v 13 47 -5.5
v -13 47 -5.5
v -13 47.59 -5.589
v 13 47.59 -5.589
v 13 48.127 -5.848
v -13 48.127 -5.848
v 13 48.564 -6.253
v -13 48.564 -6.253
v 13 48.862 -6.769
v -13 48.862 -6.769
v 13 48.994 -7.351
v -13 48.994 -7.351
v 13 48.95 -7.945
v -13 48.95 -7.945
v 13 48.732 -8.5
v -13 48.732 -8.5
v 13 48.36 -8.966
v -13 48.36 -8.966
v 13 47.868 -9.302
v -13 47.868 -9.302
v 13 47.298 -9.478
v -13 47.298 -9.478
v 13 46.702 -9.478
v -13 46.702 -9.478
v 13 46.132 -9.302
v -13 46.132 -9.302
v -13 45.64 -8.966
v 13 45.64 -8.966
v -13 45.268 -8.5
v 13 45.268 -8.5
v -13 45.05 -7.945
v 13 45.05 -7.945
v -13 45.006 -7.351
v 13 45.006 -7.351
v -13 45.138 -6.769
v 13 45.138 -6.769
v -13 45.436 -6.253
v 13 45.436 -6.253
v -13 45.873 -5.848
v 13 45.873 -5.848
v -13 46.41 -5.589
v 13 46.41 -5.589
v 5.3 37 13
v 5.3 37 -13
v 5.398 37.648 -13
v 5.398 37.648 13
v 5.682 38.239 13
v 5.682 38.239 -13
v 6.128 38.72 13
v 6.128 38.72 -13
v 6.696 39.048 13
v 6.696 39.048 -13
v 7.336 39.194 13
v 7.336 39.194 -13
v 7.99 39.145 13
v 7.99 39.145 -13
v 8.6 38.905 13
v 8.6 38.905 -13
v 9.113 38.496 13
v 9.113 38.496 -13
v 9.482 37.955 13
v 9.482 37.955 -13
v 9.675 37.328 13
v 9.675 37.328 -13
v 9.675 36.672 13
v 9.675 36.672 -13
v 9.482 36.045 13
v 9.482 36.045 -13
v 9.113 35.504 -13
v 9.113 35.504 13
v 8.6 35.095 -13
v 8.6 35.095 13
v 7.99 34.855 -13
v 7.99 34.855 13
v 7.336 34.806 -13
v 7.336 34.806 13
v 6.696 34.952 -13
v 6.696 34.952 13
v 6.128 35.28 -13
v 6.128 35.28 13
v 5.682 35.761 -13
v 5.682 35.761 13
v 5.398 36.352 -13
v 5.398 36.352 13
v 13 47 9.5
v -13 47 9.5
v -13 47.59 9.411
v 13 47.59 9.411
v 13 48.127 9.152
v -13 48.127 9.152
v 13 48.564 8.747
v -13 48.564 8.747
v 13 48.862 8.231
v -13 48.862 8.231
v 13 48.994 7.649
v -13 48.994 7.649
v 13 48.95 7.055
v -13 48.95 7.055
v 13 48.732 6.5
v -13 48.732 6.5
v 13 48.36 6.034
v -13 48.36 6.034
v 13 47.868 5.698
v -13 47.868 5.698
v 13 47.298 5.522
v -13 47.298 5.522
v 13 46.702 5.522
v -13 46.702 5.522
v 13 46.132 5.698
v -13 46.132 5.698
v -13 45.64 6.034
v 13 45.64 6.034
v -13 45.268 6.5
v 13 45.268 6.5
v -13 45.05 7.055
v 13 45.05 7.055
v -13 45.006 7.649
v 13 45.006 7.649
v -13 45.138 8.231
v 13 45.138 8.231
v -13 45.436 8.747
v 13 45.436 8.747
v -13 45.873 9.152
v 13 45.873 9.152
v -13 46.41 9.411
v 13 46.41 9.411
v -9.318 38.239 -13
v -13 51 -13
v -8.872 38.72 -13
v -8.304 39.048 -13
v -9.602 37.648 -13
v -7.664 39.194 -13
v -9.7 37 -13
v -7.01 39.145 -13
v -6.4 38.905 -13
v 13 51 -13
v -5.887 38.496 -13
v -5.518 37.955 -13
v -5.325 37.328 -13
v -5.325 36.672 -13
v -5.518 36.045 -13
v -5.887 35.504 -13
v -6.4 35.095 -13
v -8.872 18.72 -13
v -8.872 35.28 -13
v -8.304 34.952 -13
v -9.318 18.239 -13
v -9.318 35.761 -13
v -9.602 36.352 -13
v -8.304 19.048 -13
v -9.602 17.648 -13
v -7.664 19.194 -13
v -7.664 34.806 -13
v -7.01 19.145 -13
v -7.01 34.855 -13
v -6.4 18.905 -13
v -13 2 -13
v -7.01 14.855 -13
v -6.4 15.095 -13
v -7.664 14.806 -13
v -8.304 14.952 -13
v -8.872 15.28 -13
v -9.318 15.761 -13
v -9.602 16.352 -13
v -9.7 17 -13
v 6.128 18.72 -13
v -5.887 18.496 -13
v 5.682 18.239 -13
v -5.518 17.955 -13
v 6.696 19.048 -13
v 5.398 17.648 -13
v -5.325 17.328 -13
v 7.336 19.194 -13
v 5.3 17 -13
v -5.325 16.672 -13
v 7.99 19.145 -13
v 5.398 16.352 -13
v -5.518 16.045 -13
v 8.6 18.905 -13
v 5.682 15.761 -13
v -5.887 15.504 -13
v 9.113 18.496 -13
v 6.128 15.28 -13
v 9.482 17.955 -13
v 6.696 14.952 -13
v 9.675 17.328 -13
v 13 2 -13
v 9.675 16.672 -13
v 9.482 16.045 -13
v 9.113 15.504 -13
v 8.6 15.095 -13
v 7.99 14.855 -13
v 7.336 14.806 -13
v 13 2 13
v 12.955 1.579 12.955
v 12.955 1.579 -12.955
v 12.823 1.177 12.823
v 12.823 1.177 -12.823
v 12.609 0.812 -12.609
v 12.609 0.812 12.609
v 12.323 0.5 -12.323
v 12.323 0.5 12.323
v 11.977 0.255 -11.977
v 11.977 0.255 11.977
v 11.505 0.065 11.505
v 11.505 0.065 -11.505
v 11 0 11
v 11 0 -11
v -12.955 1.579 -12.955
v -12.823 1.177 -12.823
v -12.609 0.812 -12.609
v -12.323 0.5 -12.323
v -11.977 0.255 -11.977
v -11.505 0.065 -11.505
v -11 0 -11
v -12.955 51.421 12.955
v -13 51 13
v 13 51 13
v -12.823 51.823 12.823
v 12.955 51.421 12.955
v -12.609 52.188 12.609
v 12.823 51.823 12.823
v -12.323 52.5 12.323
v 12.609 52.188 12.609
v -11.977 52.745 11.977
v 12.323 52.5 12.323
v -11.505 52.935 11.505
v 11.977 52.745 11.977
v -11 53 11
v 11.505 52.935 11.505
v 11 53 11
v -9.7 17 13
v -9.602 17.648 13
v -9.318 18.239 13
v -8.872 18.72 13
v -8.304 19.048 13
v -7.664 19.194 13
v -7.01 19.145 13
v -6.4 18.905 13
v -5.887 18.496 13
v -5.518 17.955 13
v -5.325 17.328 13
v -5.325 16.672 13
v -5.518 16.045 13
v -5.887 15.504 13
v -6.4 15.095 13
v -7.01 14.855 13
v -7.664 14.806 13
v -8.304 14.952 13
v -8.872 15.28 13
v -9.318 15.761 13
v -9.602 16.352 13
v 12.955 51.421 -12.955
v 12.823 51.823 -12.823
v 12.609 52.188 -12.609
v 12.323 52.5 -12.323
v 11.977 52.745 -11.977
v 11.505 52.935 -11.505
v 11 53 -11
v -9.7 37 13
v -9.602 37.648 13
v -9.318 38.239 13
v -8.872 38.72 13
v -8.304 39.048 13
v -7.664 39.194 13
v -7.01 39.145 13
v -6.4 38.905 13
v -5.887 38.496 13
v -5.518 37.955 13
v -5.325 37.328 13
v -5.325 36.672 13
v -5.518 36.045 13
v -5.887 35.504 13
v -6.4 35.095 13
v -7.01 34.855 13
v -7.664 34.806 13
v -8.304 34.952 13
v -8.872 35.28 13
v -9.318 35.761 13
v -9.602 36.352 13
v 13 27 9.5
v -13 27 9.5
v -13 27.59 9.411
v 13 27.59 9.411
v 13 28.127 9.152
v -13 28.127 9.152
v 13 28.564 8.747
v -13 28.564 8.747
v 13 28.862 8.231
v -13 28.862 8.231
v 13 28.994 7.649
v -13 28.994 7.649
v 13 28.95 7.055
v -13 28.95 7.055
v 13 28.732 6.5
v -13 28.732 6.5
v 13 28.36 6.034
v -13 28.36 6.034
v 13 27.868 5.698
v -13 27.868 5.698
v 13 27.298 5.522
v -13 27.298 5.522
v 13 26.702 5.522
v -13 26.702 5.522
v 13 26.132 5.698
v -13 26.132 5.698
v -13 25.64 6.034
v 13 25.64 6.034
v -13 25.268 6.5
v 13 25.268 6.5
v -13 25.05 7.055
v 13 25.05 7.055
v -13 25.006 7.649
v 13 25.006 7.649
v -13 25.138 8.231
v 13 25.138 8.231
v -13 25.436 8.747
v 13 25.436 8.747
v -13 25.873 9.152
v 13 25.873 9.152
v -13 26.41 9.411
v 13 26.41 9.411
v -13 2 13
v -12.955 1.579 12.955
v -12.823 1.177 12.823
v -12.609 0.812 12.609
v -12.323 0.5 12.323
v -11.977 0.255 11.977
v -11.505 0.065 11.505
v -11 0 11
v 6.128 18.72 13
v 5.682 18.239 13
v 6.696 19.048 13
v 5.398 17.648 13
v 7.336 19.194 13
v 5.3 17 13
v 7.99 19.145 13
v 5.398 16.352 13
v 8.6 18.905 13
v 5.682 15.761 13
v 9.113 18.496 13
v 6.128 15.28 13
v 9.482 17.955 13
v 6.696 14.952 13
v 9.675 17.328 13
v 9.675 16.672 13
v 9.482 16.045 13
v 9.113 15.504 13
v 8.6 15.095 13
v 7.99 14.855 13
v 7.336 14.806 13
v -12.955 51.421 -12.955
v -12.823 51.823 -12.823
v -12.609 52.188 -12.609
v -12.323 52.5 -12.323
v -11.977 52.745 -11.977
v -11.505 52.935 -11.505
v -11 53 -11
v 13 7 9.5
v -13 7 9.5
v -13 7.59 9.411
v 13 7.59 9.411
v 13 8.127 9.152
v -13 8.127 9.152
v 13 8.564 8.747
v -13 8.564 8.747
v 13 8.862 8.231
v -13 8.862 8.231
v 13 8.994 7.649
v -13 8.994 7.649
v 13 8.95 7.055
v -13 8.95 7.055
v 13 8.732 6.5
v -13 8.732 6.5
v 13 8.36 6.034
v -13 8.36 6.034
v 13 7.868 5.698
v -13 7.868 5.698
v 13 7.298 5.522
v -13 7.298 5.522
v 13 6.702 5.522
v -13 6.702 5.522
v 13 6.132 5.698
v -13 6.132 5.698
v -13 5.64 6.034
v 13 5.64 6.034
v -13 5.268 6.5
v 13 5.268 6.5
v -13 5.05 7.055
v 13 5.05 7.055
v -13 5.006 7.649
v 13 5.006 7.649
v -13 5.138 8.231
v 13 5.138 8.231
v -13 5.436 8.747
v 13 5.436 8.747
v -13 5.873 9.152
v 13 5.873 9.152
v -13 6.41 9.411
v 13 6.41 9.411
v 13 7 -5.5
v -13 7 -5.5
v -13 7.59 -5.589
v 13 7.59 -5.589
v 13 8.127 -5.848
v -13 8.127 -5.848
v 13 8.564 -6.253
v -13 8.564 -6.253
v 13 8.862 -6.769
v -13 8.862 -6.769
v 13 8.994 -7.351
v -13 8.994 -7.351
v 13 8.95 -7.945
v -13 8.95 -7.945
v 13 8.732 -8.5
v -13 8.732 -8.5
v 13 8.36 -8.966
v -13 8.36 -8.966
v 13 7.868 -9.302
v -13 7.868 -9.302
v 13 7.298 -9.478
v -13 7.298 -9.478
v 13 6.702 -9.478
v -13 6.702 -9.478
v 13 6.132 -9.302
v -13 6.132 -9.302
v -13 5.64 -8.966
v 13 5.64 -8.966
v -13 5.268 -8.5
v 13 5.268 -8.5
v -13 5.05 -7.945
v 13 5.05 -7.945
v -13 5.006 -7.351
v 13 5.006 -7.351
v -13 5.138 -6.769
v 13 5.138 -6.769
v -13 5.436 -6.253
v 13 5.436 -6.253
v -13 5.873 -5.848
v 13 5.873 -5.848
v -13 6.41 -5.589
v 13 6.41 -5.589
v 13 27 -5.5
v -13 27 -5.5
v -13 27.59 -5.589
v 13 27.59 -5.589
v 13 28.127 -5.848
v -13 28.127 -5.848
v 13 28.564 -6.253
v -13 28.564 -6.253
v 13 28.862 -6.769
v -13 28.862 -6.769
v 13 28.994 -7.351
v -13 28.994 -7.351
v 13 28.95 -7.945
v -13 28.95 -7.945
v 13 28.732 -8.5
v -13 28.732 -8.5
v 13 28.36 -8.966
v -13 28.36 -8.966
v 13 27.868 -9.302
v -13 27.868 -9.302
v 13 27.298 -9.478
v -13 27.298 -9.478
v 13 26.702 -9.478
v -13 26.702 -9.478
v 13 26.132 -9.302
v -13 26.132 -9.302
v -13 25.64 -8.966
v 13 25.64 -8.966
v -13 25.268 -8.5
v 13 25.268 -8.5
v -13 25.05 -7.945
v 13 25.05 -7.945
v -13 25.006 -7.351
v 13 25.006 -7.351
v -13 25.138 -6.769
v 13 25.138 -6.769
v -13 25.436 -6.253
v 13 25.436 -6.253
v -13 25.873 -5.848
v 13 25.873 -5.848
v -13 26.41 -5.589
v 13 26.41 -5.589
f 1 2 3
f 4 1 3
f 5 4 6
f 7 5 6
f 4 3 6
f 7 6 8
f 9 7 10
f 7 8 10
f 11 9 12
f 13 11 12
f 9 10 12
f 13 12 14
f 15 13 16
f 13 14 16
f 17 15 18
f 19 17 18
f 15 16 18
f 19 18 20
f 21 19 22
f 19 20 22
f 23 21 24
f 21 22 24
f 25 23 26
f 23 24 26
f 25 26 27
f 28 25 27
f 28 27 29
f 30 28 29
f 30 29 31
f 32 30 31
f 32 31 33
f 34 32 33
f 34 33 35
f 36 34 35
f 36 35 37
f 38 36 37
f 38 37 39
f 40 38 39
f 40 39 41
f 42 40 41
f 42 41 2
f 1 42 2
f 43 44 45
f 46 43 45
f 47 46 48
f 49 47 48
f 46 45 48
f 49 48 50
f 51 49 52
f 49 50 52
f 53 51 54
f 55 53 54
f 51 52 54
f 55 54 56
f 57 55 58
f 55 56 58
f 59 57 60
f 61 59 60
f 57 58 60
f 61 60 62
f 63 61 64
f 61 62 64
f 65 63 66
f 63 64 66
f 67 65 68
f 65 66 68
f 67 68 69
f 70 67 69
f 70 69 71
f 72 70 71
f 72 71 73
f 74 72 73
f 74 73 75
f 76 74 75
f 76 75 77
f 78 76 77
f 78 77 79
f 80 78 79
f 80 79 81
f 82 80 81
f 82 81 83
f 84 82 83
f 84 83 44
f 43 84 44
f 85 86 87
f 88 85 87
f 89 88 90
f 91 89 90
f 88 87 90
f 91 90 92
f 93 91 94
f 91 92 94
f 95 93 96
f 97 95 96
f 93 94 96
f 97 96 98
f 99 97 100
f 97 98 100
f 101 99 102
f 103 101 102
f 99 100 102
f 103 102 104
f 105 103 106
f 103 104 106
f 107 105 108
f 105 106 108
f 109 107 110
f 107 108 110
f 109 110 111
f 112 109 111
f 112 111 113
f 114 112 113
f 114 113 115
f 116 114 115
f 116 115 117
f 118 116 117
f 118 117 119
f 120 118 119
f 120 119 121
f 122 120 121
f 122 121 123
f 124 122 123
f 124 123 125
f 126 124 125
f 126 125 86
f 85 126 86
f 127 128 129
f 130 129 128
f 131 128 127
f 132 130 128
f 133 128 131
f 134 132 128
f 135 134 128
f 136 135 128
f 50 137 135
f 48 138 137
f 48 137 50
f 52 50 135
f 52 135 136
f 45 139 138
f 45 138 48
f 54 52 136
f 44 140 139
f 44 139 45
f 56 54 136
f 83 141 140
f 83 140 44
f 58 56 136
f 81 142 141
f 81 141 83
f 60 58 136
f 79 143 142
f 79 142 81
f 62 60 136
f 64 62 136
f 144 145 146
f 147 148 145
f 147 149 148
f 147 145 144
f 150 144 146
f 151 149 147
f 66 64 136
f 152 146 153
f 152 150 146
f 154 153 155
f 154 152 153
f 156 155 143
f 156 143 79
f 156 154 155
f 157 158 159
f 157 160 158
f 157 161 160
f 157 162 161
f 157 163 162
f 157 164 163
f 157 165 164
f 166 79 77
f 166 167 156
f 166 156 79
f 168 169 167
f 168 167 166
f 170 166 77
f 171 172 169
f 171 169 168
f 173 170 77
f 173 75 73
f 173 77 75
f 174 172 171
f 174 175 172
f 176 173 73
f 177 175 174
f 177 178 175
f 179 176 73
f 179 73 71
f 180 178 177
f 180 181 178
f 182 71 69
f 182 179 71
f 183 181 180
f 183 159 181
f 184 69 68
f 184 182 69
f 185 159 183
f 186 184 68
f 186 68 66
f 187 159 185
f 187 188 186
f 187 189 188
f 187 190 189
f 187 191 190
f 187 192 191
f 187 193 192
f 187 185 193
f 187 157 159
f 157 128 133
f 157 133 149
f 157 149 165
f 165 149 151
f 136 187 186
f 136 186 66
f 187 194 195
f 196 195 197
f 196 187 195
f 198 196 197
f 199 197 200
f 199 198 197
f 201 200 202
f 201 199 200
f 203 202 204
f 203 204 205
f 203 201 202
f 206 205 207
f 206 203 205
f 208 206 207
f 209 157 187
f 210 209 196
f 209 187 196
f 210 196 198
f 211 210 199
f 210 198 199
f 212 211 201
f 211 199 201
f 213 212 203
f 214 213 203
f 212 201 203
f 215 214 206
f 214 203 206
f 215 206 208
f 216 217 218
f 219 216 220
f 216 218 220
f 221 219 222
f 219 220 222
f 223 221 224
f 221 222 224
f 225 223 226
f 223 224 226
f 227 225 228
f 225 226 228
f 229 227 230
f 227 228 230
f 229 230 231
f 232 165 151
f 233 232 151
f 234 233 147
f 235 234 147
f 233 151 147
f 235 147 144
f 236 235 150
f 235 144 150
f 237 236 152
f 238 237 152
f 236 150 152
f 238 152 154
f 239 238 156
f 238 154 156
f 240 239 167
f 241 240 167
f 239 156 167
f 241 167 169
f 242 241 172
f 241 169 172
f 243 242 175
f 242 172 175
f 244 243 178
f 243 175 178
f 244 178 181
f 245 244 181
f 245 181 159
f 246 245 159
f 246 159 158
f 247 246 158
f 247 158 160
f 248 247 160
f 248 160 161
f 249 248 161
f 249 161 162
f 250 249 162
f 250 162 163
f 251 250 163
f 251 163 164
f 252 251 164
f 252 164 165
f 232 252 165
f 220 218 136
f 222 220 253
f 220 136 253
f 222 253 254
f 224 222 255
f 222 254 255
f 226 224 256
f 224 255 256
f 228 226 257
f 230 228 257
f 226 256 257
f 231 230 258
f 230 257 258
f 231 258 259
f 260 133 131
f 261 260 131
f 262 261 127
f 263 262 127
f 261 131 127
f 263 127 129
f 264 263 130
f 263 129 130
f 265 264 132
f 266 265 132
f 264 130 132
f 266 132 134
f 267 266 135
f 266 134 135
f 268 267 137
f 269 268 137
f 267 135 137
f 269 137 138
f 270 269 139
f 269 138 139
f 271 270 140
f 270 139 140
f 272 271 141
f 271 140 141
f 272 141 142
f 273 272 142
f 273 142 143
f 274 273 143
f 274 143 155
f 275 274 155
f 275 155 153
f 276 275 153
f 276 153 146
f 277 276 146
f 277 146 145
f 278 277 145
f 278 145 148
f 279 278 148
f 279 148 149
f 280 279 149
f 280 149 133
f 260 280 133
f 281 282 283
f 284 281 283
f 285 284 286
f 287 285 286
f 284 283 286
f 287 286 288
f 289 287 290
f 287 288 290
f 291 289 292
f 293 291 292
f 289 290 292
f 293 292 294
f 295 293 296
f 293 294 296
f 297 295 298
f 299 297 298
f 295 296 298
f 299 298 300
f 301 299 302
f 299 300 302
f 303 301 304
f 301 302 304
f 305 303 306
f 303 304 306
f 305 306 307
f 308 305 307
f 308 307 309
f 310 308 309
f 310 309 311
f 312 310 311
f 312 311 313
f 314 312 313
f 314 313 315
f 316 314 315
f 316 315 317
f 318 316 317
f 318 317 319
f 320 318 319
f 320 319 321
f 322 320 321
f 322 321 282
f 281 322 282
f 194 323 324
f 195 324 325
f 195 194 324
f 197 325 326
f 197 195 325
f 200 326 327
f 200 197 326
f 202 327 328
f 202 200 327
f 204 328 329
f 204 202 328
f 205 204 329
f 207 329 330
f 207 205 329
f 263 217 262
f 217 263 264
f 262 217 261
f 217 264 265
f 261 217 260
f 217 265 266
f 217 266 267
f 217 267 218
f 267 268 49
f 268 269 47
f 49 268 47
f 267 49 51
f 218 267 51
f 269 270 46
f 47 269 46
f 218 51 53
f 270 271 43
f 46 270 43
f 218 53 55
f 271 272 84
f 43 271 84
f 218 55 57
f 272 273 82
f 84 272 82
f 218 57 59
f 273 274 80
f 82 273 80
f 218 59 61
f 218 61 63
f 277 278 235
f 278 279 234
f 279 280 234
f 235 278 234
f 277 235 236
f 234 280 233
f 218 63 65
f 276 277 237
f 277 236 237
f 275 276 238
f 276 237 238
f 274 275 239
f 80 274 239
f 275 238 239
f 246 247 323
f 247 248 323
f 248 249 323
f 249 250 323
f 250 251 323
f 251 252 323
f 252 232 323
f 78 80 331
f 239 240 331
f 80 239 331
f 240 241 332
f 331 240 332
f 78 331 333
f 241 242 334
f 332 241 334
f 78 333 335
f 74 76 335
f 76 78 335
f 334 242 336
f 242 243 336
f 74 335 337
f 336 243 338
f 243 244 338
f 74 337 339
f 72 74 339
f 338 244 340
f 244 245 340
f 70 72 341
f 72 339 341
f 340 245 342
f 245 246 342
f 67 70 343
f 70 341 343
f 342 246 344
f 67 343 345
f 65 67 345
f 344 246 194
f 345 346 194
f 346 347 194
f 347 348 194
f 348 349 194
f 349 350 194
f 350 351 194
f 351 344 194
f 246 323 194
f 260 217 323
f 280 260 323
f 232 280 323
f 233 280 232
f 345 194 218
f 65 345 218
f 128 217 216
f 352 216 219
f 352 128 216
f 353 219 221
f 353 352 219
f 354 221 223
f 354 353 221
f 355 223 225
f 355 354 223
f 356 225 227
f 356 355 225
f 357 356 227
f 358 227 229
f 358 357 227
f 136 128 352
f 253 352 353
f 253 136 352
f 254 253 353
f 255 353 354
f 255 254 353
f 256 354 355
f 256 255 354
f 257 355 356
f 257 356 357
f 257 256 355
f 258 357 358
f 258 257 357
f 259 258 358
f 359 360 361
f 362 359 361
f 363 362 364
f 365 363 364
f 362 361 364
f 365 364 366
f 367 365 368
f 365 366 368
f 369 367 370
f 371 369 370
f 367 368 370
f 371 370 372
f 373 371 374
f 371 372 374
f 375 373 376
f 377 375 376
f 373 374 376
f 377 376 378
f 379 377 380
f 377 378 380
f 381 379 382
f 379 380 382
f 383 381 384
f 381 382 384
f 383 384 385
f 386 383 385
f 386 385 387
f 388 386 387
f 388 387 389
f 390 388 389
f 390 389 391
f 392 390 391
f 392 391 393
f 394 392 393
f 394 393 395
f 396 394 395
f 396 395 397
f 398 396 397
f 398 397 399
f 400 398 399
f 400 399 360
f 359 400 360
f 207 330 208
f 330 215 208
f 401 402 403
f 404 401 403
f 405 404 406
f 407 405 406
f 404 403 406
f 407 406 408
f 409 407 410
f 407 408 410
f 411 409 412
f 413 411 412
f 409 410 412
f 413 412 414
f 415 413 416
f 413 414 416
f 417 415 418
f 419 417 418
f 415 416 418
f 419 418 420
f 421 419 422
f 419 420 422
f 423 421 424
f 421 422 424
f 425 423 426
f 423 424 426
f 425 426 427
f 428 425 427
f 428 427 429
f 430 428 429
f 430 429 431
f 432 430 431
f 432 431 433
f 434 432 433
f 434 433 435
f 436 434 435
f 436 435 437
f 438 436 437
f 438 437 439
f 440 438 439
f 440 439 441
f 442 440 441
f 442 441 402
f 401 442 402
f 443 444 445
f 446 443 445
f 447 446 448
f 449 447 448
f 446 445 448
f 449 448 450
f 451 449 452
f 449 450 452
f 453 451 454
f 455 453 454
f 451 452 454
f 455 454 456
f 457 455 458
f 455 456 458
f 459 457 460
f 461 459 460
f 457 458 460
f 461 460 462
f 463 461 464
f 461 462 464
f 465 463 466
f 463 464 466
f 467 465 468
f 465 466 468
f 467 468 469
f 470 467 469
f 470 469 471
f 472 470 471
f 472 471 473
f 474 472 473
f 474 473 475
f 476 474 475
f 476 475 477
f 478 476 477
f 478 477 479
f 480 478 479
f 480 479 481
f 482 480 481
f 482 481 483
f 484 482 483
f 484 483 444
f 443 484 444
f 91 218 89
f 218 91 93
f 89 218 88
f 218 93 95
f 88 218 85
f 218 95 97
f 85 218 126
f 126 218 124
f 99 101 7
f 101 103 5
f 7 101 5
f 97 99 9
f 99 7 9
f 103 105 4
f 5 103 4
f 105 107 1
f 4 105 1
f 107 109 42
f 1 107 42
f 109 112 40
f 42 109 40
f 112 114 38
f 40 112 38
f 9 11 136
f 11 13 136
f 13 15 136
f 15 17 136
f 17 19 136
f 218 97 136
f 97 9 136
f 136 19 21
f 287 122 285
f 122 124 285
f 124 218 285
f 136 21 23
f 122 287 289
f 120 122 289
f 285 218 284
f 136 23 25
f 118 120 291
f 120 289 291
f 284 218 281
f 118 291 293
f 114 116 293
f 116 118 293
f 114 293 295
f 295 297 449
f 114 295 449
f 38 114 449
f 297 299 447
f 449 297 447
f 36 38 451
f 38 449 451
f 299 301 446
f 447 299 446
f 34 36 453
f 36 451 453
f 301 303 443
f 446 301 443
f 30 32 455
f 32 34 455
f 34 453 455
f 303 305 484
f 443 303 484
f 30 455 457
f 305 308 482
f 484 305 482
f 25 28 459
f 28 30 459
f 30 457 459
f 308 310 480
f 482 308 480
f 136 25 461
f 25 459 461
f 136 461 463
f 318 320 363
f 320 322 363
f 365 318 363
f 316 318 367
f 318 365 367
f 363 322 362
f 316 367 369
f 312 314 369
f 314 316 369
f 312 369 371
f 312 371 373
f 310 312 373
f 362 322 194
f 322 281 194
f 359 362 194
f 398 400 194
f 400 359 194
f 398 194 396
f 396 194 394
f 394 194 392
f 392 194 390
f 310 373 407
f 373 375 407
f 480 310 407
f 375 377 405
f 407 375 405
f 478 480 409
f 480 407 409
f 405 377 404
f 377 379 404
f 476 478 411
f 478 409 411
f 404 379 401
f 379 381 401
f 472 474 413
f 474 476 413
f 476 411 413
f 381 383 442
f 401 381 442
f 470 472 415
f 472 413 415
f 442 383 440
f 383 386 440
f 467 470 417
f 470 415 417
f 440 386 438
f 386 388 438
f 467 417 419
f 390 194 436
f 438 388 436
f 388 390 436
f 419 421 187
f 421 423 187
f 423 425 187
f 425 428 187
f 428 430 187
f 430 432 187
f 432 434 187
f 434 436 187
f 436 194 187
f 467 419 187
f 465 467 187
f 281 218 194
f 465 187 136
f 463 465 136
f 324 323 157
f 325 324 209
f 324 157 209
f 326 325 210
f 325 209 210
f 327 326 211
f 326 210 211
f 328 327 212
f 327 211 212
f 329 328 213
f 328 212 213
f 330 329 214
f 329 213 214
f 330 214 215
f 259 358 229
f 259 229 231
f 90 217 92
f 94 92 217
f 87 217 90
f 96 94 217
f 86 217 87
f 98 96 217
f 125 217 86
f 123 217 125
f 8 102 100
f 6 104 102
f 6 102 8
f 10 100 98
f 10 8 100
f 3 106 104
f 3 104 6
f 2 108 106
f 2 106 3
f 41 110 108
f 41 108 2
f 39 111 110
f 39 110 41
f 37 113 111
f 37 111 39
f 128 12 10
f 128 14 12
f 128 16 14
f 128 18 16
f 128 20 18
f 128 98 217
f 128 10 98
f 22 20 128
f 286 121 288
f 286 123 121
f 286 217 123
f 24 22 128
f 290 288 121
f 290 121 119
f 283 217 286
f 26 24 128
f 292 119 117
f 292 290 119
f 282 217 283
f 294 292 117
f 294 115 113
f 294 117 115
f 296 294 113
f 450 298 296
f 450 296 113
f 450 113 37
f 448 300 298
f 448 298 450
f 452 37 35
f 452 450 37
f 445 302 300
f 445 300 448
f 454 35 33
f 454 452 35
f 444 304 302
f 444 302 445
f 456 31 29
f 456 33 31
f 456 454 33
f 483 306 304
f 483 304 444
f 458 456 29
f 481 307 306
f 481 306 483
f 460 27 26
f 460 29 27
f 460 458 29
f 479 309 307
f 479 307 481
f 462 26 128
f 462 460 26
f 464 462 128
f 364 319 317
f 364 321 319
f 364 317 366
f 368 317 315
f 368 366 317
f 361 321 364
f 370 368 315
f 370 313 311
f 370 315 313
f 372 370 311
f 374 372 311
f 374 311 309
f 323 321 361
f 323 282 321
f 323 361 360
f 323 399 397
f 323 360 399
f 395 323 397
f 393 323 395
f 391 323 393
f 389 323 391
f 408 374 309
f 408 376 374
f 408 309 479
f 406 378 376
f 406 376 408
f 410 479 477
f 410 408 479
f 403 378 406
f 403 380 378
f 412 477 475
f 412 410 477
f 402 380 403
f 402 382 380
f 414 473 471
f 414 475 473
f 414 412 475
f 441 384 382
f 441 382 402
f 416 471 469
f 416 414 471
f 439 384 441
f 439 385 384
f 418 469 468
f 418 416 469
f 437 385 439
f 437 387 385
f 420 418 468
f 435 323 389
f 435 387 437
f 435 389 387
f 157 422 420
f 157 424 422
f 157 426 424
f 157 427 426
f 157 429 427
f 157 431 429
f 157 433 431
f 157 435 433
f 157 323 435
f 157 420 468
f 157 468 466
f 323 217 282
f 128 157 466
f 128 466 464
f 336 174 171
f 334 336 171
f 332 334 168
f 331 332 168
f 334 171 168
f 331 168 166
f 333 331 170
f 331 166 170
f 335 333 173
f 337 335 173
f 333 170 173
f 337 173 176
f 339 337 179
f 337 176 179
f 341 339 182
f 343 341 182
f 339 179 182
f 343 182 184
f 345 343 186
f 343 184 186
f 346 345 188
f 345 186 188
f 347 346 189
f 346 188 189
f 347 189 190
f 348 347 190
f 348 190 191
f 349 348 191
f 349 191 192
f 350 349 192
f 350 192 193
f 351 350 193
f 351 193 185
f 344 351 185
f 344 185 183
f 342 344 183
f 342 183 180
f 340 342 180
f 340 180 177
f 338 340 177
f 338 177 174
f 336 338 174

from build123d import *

# Parameters (mm, degrees)
SKETCH_1_W          = 26
SKETCH_1_H          = 26
EXTRUDE_1_DEPTH     = 53
FILLET_2_R          = 2
CUT_EXTRUDE_1_REACH = 62.448
SKETCH_2_R          = 1.55
CUT_EXTRUDE_2_REACH = 62.448
SKETCH_3_R          = 2
CUT_EXTRUDE_3_REACH = 62.448
SKETCH_4_R          = 2.2


with BuildPart() as part:
    # 草图1 → 凸台-拉伸1 (new body)
    with BuildSketch(Plane(origin=(0, 0, 0), x_dir=(1, 0, 0), z_dir=(0, 1, 0))):
        Rectangle(SKETCH_1_W, SKETCH_1_H)
    extrude(amount=EXTRUDE_1_DEPTH)

    # 圆角2
    fillet_2_edges = [part.edges().sort_by_distance(p)[0] for p in [
        (-13, 53, 0),
        (0, 53, 13),
        (13, 53, 0),
        (0, 0, 13),
        (-13, 0, 0),
        (0, 0, -13),
        (13, 0, 0),
        (0, 53, -13),
    ]]
    fillet(fillet_2_edges, radius=FILLET_2_R)

    # 草图2 → 切除-拉伸1 (cut, up to next)
    with BuildSketch(Plane.XY.offset(13), mode=Mode.PRIVATE) as cut_extrude_1_sk1:
        with Locations((-7.5, 37)):
            Circle(SKETCH_2_R)
    cut_extrude_1_tool1 = extrude(cut_extrude_1_sk1.sketch, amount=-CUT_EXTRUDE_1_REACH, mode=Mode.PRIVATE) & part.part
    # 草图2 → 切除-拉伸1 (cut, up to next)
    with BuildSketch(Plane.XY.offset(13), mode=Mode.PRIVATE) as cut_extrude_1_sk2:
        with Locations((7.5, 37)):
            Circle(SKETCH_2_R)
    cut_extrude_1_tool2 = extrude(cut_extrude_1_sk2.sketch, amount=-CUT_EXTRUDE_1_REACH, mode=Mode.PRIVATE) & part.part
    # 草图2 → 切除-拉伸1 (cut, up to next)
    with BuildSketch(Plane.XY.offset(13), mode=Mode.PRIVATE) as cut_extrude_1_sk3:
        with Locations((-7.5, 17)):
            Circle(SKETCH_2_R)
    cut_extrude_1_tool3 = extrude(cut_extrude_1_sk3.sketch, amount=-CUT_EXTRUDE_1_REACH, mode=Mode.PRIVATE) & part.part
    # 草图2 → 切除-拉伸1 (cut, up to next)
    with BuildSketch(Plane.XY.offset(13), mode=Mode.PRIVATE) as cut_extrude_1_sk4:
        with Locations((7.5, 17)):
            Circle(SKETCH_2_R)
    cut_extrude_1_tool4 = extrude(cut_extrude_1_sk4.sketch, amount=-CUT_EXTRUDE_1_REACH, mode=Mode.PRIVATE) & part.part
    add(cut_extrude_1_tool1.solids().sort_by_distance((-7.5, 37, 13))[0], mode=Mode.SUBTRACT)
    add(cut_extrude_1_tool2.solids().sort_by_distance((7.5, 37, 13))[0], mode=Mode.SUBTRACT)
    add(cut_extrude_1_tool3.solids().sort_by_distance((-7.5, 17, 13))[0], mode=Mode.SUBTRACT)
    add(cut_extrude_1_tool4.solids().sort_by_distance((7.5, 17, 13))[0], mode=Mode.SUBTRACT)

    # 草图3 → 切除-拉伸2 (cut, up to next)
    with BuildSketch(Plane.ZY.offset(13), mode=Mode.PRIVATE) as cut_extrude_2_sk1:
        with Locations((-7.5, 47)):
            Circle(SKETCH_3_R)
    cut_extrude_2_tool1 = extrude(cut_extrude_2_sk1.sketch, amount=-CUT_EXTRUDE_2_REACH, mode=Mode.PRIVATE) & part.part
    # 草图3 → 切除-拉伸2 (cut, up to next)
    with BuildSketch(Plane.ZY.offset(13), mode=Mode.PRIVATE) as cut_extrude_2_sk2:
        with Locations((7.5, 47)):
            Circle(SKETCH_3_R)
    cut_extrude_2_tool2 = extrude(cut_extrude_2_sk2.sketch, amount=-CUT_EXTRUDE_2_REACH, mode=Mode.PRIVATE) & part.part
    # 草图3 → 切除-拉伸2 (cut, up to next)
    with BuildSketch(Plane.ZY.offset(13), mode=Mode.PRIVATE) as cut_extrude_2_sk3:
        with Locations((-7.5, 27)):
            Circle(SKETCH_3_R)
    cut_extrude_2_tool3 = extrude(cut_extrude_2_sk3.sketch, amount=-CUT_EXTRUDE_2_REACH, mode=Mode.PRIVATE) & part.part
    # 草图3 → 切除-拉伸2 (cut, up to next)
    with BuildSketch(Plane.ZY.offset(13), mode=Mode.PRIVATE) as cut_extrude_2_sk4:
        with Locations((7.5, 27)):
            Circle(SKETCH_3_R)
    cut_extrude_2_tool4 = extrude(cut_extrude_2_sk4.sketch, amount=-CUT_EXTRUDE_2_REACH, mode=Mode.PRIVATE) & part.part
    # 草图3 → 切除-拉伸2 (cut, up to next)
    with BuildSketch(Plane.ZY.offset(13), mode=Mode.PRIVATE) as cut_extrude_2_sk5:
        with Locations((-7.5, 7)):
            Circle(SKETCH_3_R)
    cut_extrude_2_tool5 = extrude(cut_extrude_2_sk5.sketch, amount=-CUT_EXTRUDE_2_REACH, mode=Mode.PRIVATE) & part.part
    # 草图3 → 切除-拉伸2 (cut, up to next)
    with BuildSketch(Plane.ZY.offset(13), mode=Mode.PRIVATE) as cut_extrude_2_sk6:
        with Locations((7.5, 7)):
            Circle(SKETCH_3_R)
    cut_extrude_2_tool6 = extrude(cut_extrude_2_sk6.sketch, amount=-CUT_EXTRUDE_2_REACH, mode=Mode.PRIVATE) & part.part
    add(cut_extrude_2_tool1.solids().sort_by_distance((-13, 47, -7.5))[0], mode=Mode.SUBTRACT)
    add(cut_extrude_2_tool2.solids().sort_by_distance((-13, 47, 7.5))[0], mode=Mode.SUBTRACT)
    add(cut_extrude_2_tool3.solids().sort_by_distance((-13, 27, -7.5))[0], mode=Mode.SUBTRACT)
    add(cut_extrude_2_tool4.solids().sort_by_distance((-13, 27, 7.5))[0], mode=Mode.SUBTRACT)
    add(cut_extrude_2_tool5.solids().sort_by_distance((-13, 7, -7.5))[0], mode=Mode.SUBTRACT)
    add(cut_extrude_2_tool6.solids().sort_by_distance((-13, 7, 7.5))[0], mode=Mode.SUBTRACT)

    # 草图4 → 切除-拉伸3 (cut, up to next)
    with BuildSketch(Plane(origin=(0, 0, -13), x_dir=(-1, 0, 0), z_dir=(0, 0, -1)), mode=Mode.PRIVATE) as cut_extrude_3_sk1:
        with Locations((-7.5, 37)):
            Circle(SKETCH_4_R)
    cut_extrude_3_tool1 = extrude(cut_extrude_3_sk1.sketch, amount=-CUT_EXTRUDE_3_REACH, mode=Mode.PRIVATE) & part.part
    # 草图4 → 切除-拉伸3 (cut, up to next)
    with BuildSketch(Plane(origin=(0, 0, -13), x_dir=(-1, 0, 0), z_dir=(0, 0, -1)), mode=Mode.PRIVATE) as cut_extrude_3_sk2:
        with Locations((7.5, 37)):
            Circle(SKETCH_4_R)
    cut_extrude_3_tool2 = extrude(cut_extrude_3_sk2.sketch, amount=-CUT_EXTRUDE_3_REACH, mode=Mode.PRIVATE) & part.part
    # 草图4 → 切除-拉伸3 (cut, up to next)
    with BuildSketch(Plane(origin=(0, 0, -13), x_dir=(-1, 0, 0), z_dir=(0, 0, -1)), mode=Mode.PRIVATE) as cut_extrude_3_sk3:
        with Locations((7.5, 17)):
            Circle(SKETCH_4_R)
    cut_extrude_3_tool3 = extrude(cut_extrude_3_sk3.sketch, amount=-CUT_EXTRUDE_3_REACH, mode=Mode.PRIVATE) & part.part
    # 草图4 → 切除-拉伸3 (cut, up to next)
    with BuildSketch(Plane(origin=(0, 0, -13), x_dir=(-1, 0, 0), z_dir=(0, 0, -1)), mode=Mode.PRIVATE) as cut_extrude_3_sk4:
        with Locations((-7.5, 17)):
            Circle(SKETCH_4_R)
    cut_extrude_3_tool4 = extrude(cut_extrude_3_sk4.sketch, amount=-CUT_EXTRUDE_3_REACH, mode=Mode.PRIVATE) & part.part
    add(cut_extrude_3_tool1.solids().sort_by_distance((7.5, 37, -13))[0], mode=Mode.SUBTRACT)
    add(cut_extrude_3_tool2.solids().sort_by_distance((-7.5, 37, -13))[0], mode=Mode.SUBTRACT)
    add(cut_extrude_3_tool3.solids().sort_by_distance((-7.5, 17, -13))[0], mode=Mode.SUBTRACT)
    add(cut_extrude_3_tool4.solids().sort_by_distance((7.5, 17, -13))[0], mode=Mode.SUBTRACT)


solid = part.part
